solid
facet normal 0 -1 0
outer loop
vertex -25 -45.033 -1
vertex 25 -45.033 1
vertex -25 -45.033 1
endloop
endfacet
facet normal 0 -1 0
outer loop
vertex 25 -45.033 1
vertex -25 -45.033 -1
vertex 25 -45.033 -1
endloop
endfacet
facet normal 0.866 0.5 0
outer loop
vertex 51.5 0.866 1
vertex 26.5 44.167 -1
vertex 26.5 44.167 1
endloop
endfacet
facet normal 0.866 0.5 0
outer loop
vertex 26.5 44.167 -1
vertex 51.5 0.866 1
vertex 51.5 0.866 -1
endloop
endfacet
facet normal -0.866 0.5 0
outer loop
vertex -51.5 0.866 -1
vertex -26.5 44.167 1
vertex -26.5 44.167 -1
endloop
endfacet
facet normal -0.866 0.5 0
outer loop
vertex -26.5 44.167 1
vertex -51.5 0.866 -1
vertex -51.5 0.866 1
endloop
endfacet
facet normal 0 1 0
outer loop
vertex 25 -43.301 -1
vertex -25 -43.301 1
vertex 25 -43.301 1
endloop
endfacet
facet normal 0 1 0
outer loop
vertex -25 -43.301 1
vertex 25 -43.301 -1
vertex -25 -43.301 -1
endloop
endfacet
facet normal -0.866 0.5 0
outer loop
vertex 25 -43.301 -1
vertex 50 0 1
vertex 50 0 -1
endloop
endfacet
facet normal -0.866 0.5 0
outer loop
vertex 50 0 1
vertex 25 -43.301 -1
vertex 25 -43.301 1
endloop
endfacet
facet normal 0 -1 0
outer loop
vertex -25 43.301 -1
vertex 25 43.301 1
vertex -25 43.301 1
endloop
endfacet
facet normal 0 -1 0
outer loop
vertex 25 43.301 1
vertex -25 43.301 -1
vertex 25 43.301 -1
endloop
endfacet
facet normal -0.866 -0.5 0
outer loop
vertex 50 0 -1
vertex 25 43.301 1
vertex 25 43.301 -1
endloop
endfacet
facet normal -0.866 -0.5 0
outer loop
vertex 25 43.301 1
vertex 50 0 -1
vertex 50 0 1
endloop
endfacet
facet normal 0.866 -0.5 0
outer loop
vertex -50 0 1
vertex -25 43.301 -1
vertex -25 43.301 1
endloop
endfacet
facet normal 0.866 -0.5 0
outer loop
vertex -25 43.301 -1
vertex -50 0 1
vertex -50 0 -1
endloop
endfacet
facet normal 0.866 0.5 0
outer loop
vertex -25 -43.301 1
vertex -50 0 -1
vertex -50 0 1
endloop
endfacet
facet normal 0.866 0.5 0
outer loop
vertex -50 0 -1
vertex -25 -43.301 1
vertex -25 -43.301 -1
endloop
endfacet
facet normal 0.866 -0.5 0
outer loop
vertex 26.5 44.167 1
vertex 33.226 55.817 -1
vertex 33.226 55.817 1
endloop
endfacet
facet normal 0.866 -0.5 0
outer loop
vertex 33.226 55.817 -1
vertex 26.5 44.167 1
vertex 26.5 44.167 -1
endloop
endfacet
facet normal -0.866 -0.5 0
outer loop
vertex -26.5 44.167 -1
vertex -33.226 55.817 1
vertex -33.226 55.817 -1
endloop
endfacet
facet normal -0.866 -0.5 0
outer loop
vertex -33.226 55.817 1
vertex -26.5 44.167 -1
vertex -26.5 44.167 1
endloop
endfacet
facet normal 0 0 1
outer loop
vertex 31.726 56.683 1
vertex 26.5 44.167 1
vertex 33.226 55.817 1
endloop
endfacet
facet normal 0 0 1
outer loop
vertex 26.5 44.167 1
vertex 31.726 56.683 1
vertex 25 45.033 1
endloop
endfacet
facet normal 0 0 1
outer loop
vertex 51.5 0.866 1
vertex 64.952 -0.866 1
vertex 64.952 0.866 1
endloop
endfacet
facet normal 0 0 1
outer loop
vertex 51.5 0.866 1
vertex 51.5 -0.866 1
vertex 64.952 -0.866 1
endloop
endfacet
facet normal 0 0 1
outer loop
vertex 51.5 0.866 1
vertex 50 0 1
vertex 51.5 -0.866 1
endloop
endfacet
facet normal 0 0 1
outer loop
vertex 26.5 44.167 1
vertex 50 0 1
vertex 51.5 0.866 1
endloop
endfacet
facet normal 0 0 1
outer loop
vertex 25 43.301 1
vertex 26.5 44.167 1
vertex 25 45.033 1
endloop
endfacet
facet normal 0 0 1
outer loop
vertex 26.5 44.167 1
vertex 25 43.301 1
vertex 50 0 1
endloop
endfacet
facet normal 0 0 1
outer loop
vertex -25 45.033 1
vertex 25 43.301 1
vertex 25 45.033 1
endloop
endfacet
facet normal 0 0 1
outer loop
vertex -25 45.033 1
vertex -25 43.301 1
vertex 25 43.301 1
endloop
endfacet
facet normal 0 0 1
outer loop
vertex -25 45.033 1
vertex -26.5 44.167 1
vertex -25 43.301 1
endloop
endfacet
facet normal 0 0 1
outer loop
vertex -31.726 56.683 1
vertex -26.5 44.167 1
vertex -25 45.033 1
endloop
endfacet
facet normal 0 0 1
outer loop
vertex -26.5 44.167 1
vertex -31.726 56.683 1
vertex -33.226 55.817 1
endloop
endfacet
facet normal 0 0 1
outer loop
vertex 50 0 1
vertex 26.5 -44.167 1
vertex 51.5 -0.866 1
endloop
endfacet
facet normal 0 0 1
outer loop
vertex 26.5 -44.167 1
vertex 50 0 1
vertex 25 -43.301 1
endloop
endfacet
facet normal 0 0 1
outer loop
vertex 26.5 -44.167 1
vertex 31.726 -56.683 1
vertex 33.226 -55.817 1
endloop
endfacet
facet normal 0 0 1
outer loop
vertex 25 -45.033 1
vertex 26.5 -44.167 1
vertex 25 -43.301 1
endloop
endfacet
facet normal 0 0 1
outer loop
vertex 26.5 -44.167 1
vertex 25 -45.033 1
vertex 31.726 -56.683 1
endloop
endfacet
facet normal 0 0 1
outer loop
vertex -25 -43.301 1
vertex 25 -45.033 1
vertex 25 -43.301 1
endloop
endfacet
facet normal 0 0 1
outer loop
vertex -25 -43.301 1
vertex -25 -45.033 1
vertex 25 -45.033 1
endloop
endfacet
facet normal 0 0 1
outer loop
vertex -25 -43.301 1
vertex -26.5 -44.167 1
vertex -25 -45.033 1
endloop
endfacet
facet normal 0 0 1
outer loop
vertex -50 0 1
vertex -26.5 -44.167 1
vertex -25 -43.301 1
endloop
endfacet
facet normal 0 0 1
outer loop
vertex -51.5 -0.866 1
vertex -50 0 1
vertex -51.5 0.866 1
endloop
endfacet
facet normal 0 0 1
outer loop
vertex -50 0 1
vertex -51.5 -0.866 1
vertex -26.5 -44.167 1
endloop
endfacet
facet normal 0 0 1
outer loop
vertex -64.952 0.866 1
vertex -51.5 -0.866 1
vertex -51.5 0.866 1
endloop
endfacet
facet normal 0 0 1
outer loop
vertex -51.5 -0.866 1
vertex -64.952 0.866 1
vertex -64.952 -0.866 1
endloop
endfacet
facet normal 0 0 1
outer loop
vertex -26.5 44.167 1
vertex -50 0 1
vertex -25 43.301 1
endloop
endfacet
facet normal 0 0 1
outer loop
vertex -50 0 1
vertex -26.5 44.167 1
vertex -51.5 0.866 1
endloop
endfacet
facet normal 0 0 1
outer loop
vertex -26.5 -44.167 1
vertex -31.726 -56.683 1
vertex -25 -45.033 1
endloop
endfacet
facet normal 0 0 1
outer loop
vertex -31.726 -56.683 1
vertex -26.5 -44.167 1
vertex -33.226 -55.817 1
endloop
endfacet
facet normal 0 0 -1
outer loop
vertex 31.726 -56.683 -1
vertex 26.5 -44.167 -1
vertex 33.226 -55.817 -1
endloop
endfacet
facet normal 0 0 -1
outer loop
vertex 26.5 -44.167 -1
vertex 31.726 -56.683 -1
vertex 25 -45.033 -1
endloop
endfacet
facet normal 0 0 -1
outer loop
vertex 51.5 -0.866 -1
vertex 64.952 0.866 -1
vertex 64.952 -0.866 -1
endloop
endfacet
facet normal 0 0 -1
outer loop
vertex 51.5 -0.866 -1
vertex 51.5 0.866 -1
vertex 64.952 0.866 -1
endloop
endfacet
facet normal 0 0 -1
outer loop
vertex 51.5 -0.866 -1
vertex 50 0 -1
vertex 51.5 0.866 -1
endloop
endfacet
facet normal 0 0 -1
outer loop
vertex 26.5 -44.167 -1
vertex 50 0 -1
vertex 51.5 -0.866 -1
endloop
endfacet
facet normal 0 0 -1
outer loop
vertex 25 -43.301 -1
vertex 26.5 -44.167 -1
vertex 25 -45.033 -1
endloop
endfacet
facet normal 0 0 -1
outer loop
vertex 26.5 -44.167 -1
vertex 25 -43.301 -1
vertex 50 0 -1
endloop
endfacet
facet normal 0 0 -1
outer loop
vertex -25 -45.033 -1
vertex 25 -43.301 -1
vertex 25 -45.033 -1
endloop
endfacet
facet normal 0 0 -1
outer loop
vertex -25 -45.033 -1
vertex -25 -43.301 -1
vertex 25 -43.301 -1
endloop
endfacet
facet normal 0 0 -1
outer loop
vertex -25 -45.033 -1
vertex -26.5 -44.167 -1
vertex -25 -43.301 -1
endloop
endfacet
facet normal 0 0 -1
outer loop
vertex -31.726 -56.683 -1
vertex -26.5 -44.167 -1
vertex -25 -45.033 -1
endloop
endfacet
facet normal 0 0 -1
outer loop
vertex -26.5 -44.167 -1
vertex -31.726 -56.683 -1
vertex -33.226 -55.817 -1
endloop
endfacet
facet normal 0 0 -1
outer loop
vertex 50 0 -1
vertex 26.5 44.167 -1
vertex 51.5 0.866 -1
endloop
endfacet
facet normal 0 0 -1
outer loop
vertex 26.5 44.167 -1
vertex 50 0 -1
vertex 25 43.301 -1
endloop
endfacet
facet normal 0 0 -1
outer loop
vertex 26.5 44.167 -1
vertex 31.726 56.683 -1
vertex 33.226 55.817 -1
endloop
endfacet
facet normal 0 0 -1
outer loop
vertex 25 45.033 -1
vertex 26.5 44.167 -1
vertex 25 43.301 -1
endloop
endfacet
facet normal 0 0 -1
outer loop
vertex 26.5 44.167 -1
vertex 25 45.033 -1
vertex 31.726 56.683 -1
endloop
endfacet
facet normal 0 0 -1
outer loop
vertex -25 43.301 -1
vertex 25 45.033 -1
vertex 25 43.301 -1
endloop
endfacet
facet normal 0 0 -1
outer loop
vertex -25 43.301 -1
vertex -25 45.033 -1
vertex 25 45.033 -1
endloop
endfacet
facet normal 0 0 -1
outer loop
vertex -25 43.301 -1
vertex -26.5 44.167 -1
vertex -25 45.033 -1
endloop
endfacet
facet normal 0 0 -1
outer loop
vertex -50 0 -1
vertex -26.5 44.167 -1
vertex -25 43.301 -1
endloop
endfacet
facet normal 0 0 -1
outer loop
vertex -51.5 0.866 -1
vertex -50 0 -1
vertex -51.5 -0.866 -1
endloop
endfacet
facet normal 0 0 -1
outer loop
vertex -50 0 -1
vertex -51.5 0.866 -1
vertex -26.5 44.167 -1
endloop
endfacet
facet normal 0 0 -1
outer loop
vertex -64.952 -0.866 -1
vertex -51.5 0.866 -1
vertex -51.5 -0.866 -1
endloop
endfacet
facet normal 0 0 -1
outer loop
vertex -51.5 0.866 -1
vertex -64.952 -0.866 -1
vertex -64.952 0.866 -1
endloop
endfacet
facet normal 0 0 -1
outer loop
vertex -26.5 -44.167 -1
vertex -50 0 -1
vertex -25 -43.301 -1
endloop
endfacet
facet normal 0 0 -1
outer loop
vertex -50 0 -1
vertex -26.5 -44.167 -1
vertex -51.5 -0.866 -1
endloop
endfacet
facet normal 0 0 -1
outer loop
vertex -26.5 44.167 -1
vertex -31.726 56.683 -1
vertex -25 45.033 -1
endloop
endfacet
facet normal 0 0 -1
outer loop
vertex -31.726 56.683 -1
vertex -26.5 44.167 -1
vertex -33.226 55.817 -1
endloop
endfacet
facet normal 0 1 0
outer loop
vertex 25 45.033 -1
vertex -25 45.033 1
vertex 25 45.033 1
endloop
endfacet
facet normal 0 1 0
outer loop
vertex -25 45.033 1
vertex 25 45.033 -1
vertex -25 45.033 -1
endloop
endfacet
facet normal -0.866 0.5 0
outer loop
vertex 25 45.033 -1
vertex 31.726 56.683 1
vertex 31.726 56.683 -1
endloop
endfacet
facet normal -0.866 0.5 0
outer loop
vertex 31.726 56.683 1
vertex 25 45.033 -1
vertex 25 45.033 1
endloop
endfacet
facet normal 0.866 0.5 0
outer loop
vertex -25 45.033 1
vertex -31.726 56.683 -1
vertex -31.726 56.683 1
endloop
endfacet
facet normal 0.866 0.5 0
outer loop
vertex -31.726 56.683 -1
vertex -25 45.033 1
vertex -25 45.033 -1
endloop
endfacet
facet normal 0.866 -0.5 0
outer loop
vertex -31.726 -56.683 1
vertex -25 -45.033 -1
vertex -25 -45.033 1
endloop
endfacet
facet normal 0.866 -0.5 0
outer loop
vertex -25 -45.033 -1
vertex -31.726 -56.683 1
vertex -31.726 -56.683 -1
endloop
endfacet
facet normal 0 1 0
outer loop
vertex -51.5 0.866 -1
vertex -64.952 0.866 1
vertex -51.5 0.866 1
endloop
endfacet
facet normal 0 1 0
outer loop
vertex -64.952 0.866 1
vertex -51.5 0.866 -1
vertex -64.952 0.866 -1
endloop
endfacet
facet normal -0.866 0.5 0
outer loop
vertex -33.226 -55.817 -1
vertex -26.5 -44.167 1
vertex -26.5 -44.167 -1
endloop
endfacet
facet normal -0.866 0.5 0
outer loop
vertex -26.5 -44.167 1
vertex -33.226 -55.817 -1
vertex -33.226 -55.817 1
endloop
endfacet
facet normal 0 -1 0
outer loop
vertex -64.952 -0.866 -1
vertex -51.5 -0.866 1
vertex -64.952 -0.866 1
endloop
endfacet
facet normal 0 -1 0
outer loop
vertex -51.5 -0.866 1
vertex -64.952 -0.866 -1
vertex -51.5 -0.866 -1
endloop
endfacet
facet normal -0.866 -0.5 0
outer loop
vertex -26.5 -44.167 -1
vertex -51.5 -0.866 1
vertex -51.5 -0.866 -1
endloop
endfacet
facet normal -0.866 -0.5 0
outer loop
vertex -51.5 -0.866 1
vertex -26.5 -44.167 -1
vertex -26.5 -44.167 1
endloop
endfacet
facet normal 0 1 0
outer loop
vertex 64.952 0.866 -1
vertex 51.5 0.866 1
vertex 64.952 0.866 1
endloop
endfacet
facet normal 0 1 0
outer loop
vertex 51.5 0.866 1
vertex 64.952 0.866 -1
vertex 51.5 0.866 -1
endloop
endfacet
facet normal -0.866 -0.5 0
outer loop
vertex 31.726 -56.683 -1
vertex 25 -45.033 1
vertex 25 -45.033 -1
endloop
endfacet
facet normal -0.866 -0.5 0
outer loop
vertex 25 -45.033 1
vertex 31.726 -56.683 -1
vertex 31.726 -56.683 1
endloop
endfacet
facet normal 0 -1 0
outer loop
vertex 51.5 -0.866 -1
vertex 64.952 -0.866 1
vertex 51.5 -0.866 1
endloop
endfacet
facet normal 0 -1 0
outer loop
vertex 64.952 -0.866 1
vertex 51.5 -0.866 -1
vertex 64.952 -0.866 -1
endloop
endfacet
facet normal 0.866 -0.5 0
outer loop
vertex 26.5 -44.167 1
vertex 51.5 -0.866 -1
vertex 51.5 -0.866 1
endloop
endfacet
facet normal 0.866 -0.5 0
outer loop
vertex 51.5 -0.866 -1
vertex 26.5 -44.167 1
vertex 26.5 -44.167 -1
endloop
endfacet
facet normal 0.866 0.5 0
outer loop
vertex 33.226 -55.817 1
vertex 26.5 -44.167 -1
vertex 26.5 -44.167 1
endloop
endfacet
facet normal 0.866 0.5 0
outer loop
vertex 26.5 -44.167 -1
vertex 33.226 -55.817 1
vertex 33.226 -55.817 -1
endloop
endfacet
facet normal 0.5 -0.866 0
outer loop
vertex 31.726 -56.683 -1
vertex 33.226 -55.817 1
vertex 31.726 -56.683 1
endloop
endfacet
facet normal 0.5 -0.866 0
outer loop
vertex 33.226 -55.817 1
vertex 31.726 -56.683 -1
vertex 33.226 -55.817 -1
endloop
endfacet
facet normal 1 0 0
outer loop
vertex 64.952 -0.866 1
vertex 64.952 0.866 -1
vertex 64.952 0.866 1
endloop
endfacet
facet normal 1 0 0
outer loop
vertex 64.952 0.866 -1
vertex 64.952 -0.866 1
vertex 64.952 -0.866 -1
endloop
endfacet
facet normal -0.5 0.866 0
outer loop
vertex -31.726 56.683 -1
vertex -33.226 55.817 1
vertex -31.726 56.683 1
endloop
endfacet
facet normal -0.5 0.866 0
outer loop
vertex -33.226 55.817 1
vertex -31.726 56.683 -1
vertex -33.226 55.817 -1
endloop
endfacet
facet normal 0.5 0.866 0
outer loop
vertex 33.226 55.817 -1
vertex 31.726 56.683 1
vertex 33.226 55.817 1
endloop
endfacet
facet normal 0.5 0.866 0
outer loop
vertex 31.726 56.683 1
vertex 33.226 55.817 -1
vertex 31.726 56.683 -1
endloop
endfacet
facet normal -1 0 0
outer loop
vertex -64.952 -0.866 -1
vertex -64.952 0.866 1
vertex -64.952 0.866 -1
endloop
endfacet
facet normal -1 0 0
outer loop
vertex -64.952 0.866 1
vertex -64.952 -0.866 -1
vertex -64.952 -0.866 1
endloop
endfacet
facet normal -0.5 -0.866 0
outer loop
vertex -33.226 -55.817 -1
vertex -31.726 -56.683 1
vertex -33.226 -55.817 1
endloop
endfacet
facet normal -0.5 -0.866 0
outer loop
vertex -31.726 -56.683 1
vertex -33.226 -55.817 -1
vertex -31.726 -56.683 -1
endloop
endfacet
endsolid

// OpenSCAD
radius=50;
distance=2;
side=(sqrt(3) / 2) * (radius + distance/2);
height = 2;

intersection(){
    union(){
        difference(){
            cylinder(r=radius + distance, h=5, $fn=6,center = true);
            cylinder(r=radius, h=6, $fn=6,center = true);
        }
    
        x = (side) * 2 * cos(60 + 30);
        y = (side) * 2 * sin(60 + 30);
        translate([x,y,0]){
            color([1,0,0]) //red
            difference(){
                cylinder(r=radius + distance, h=height, $fn=6,center = true);
                cylinder(r=radius, h=height, $fn=6,center = true);
            }
        }

        x2 = (side) * 2 * cos(180 + 30);
        y2 = (side) * 2 * sin(180 + 30);
        translate([x2,y2,0]){
            color([0,1,0]) //green
            difference(){
                cylinder(r=radius + distance, h=height, $fn=6,center = true);
                cylinder(r=radius, h=height, $fn=6,center = true);
            }
        }

        x3 = (side) * 2 * cos(300 + 30);
        y3 = (side) * 2 * sin(300 + 30);
        translate([x3,y3,0]){
            color([0,0,1]) //blue
            difference(){
                cylinder(r=radius + distance, h=height, $fn=6,center = true);
                cylinder(r=radius, h=height, $fn=6,center = true);
            }
        }
    }

    rotate(30) cylinder(r=150/2, h=height, $fn=6,center = true);
}
